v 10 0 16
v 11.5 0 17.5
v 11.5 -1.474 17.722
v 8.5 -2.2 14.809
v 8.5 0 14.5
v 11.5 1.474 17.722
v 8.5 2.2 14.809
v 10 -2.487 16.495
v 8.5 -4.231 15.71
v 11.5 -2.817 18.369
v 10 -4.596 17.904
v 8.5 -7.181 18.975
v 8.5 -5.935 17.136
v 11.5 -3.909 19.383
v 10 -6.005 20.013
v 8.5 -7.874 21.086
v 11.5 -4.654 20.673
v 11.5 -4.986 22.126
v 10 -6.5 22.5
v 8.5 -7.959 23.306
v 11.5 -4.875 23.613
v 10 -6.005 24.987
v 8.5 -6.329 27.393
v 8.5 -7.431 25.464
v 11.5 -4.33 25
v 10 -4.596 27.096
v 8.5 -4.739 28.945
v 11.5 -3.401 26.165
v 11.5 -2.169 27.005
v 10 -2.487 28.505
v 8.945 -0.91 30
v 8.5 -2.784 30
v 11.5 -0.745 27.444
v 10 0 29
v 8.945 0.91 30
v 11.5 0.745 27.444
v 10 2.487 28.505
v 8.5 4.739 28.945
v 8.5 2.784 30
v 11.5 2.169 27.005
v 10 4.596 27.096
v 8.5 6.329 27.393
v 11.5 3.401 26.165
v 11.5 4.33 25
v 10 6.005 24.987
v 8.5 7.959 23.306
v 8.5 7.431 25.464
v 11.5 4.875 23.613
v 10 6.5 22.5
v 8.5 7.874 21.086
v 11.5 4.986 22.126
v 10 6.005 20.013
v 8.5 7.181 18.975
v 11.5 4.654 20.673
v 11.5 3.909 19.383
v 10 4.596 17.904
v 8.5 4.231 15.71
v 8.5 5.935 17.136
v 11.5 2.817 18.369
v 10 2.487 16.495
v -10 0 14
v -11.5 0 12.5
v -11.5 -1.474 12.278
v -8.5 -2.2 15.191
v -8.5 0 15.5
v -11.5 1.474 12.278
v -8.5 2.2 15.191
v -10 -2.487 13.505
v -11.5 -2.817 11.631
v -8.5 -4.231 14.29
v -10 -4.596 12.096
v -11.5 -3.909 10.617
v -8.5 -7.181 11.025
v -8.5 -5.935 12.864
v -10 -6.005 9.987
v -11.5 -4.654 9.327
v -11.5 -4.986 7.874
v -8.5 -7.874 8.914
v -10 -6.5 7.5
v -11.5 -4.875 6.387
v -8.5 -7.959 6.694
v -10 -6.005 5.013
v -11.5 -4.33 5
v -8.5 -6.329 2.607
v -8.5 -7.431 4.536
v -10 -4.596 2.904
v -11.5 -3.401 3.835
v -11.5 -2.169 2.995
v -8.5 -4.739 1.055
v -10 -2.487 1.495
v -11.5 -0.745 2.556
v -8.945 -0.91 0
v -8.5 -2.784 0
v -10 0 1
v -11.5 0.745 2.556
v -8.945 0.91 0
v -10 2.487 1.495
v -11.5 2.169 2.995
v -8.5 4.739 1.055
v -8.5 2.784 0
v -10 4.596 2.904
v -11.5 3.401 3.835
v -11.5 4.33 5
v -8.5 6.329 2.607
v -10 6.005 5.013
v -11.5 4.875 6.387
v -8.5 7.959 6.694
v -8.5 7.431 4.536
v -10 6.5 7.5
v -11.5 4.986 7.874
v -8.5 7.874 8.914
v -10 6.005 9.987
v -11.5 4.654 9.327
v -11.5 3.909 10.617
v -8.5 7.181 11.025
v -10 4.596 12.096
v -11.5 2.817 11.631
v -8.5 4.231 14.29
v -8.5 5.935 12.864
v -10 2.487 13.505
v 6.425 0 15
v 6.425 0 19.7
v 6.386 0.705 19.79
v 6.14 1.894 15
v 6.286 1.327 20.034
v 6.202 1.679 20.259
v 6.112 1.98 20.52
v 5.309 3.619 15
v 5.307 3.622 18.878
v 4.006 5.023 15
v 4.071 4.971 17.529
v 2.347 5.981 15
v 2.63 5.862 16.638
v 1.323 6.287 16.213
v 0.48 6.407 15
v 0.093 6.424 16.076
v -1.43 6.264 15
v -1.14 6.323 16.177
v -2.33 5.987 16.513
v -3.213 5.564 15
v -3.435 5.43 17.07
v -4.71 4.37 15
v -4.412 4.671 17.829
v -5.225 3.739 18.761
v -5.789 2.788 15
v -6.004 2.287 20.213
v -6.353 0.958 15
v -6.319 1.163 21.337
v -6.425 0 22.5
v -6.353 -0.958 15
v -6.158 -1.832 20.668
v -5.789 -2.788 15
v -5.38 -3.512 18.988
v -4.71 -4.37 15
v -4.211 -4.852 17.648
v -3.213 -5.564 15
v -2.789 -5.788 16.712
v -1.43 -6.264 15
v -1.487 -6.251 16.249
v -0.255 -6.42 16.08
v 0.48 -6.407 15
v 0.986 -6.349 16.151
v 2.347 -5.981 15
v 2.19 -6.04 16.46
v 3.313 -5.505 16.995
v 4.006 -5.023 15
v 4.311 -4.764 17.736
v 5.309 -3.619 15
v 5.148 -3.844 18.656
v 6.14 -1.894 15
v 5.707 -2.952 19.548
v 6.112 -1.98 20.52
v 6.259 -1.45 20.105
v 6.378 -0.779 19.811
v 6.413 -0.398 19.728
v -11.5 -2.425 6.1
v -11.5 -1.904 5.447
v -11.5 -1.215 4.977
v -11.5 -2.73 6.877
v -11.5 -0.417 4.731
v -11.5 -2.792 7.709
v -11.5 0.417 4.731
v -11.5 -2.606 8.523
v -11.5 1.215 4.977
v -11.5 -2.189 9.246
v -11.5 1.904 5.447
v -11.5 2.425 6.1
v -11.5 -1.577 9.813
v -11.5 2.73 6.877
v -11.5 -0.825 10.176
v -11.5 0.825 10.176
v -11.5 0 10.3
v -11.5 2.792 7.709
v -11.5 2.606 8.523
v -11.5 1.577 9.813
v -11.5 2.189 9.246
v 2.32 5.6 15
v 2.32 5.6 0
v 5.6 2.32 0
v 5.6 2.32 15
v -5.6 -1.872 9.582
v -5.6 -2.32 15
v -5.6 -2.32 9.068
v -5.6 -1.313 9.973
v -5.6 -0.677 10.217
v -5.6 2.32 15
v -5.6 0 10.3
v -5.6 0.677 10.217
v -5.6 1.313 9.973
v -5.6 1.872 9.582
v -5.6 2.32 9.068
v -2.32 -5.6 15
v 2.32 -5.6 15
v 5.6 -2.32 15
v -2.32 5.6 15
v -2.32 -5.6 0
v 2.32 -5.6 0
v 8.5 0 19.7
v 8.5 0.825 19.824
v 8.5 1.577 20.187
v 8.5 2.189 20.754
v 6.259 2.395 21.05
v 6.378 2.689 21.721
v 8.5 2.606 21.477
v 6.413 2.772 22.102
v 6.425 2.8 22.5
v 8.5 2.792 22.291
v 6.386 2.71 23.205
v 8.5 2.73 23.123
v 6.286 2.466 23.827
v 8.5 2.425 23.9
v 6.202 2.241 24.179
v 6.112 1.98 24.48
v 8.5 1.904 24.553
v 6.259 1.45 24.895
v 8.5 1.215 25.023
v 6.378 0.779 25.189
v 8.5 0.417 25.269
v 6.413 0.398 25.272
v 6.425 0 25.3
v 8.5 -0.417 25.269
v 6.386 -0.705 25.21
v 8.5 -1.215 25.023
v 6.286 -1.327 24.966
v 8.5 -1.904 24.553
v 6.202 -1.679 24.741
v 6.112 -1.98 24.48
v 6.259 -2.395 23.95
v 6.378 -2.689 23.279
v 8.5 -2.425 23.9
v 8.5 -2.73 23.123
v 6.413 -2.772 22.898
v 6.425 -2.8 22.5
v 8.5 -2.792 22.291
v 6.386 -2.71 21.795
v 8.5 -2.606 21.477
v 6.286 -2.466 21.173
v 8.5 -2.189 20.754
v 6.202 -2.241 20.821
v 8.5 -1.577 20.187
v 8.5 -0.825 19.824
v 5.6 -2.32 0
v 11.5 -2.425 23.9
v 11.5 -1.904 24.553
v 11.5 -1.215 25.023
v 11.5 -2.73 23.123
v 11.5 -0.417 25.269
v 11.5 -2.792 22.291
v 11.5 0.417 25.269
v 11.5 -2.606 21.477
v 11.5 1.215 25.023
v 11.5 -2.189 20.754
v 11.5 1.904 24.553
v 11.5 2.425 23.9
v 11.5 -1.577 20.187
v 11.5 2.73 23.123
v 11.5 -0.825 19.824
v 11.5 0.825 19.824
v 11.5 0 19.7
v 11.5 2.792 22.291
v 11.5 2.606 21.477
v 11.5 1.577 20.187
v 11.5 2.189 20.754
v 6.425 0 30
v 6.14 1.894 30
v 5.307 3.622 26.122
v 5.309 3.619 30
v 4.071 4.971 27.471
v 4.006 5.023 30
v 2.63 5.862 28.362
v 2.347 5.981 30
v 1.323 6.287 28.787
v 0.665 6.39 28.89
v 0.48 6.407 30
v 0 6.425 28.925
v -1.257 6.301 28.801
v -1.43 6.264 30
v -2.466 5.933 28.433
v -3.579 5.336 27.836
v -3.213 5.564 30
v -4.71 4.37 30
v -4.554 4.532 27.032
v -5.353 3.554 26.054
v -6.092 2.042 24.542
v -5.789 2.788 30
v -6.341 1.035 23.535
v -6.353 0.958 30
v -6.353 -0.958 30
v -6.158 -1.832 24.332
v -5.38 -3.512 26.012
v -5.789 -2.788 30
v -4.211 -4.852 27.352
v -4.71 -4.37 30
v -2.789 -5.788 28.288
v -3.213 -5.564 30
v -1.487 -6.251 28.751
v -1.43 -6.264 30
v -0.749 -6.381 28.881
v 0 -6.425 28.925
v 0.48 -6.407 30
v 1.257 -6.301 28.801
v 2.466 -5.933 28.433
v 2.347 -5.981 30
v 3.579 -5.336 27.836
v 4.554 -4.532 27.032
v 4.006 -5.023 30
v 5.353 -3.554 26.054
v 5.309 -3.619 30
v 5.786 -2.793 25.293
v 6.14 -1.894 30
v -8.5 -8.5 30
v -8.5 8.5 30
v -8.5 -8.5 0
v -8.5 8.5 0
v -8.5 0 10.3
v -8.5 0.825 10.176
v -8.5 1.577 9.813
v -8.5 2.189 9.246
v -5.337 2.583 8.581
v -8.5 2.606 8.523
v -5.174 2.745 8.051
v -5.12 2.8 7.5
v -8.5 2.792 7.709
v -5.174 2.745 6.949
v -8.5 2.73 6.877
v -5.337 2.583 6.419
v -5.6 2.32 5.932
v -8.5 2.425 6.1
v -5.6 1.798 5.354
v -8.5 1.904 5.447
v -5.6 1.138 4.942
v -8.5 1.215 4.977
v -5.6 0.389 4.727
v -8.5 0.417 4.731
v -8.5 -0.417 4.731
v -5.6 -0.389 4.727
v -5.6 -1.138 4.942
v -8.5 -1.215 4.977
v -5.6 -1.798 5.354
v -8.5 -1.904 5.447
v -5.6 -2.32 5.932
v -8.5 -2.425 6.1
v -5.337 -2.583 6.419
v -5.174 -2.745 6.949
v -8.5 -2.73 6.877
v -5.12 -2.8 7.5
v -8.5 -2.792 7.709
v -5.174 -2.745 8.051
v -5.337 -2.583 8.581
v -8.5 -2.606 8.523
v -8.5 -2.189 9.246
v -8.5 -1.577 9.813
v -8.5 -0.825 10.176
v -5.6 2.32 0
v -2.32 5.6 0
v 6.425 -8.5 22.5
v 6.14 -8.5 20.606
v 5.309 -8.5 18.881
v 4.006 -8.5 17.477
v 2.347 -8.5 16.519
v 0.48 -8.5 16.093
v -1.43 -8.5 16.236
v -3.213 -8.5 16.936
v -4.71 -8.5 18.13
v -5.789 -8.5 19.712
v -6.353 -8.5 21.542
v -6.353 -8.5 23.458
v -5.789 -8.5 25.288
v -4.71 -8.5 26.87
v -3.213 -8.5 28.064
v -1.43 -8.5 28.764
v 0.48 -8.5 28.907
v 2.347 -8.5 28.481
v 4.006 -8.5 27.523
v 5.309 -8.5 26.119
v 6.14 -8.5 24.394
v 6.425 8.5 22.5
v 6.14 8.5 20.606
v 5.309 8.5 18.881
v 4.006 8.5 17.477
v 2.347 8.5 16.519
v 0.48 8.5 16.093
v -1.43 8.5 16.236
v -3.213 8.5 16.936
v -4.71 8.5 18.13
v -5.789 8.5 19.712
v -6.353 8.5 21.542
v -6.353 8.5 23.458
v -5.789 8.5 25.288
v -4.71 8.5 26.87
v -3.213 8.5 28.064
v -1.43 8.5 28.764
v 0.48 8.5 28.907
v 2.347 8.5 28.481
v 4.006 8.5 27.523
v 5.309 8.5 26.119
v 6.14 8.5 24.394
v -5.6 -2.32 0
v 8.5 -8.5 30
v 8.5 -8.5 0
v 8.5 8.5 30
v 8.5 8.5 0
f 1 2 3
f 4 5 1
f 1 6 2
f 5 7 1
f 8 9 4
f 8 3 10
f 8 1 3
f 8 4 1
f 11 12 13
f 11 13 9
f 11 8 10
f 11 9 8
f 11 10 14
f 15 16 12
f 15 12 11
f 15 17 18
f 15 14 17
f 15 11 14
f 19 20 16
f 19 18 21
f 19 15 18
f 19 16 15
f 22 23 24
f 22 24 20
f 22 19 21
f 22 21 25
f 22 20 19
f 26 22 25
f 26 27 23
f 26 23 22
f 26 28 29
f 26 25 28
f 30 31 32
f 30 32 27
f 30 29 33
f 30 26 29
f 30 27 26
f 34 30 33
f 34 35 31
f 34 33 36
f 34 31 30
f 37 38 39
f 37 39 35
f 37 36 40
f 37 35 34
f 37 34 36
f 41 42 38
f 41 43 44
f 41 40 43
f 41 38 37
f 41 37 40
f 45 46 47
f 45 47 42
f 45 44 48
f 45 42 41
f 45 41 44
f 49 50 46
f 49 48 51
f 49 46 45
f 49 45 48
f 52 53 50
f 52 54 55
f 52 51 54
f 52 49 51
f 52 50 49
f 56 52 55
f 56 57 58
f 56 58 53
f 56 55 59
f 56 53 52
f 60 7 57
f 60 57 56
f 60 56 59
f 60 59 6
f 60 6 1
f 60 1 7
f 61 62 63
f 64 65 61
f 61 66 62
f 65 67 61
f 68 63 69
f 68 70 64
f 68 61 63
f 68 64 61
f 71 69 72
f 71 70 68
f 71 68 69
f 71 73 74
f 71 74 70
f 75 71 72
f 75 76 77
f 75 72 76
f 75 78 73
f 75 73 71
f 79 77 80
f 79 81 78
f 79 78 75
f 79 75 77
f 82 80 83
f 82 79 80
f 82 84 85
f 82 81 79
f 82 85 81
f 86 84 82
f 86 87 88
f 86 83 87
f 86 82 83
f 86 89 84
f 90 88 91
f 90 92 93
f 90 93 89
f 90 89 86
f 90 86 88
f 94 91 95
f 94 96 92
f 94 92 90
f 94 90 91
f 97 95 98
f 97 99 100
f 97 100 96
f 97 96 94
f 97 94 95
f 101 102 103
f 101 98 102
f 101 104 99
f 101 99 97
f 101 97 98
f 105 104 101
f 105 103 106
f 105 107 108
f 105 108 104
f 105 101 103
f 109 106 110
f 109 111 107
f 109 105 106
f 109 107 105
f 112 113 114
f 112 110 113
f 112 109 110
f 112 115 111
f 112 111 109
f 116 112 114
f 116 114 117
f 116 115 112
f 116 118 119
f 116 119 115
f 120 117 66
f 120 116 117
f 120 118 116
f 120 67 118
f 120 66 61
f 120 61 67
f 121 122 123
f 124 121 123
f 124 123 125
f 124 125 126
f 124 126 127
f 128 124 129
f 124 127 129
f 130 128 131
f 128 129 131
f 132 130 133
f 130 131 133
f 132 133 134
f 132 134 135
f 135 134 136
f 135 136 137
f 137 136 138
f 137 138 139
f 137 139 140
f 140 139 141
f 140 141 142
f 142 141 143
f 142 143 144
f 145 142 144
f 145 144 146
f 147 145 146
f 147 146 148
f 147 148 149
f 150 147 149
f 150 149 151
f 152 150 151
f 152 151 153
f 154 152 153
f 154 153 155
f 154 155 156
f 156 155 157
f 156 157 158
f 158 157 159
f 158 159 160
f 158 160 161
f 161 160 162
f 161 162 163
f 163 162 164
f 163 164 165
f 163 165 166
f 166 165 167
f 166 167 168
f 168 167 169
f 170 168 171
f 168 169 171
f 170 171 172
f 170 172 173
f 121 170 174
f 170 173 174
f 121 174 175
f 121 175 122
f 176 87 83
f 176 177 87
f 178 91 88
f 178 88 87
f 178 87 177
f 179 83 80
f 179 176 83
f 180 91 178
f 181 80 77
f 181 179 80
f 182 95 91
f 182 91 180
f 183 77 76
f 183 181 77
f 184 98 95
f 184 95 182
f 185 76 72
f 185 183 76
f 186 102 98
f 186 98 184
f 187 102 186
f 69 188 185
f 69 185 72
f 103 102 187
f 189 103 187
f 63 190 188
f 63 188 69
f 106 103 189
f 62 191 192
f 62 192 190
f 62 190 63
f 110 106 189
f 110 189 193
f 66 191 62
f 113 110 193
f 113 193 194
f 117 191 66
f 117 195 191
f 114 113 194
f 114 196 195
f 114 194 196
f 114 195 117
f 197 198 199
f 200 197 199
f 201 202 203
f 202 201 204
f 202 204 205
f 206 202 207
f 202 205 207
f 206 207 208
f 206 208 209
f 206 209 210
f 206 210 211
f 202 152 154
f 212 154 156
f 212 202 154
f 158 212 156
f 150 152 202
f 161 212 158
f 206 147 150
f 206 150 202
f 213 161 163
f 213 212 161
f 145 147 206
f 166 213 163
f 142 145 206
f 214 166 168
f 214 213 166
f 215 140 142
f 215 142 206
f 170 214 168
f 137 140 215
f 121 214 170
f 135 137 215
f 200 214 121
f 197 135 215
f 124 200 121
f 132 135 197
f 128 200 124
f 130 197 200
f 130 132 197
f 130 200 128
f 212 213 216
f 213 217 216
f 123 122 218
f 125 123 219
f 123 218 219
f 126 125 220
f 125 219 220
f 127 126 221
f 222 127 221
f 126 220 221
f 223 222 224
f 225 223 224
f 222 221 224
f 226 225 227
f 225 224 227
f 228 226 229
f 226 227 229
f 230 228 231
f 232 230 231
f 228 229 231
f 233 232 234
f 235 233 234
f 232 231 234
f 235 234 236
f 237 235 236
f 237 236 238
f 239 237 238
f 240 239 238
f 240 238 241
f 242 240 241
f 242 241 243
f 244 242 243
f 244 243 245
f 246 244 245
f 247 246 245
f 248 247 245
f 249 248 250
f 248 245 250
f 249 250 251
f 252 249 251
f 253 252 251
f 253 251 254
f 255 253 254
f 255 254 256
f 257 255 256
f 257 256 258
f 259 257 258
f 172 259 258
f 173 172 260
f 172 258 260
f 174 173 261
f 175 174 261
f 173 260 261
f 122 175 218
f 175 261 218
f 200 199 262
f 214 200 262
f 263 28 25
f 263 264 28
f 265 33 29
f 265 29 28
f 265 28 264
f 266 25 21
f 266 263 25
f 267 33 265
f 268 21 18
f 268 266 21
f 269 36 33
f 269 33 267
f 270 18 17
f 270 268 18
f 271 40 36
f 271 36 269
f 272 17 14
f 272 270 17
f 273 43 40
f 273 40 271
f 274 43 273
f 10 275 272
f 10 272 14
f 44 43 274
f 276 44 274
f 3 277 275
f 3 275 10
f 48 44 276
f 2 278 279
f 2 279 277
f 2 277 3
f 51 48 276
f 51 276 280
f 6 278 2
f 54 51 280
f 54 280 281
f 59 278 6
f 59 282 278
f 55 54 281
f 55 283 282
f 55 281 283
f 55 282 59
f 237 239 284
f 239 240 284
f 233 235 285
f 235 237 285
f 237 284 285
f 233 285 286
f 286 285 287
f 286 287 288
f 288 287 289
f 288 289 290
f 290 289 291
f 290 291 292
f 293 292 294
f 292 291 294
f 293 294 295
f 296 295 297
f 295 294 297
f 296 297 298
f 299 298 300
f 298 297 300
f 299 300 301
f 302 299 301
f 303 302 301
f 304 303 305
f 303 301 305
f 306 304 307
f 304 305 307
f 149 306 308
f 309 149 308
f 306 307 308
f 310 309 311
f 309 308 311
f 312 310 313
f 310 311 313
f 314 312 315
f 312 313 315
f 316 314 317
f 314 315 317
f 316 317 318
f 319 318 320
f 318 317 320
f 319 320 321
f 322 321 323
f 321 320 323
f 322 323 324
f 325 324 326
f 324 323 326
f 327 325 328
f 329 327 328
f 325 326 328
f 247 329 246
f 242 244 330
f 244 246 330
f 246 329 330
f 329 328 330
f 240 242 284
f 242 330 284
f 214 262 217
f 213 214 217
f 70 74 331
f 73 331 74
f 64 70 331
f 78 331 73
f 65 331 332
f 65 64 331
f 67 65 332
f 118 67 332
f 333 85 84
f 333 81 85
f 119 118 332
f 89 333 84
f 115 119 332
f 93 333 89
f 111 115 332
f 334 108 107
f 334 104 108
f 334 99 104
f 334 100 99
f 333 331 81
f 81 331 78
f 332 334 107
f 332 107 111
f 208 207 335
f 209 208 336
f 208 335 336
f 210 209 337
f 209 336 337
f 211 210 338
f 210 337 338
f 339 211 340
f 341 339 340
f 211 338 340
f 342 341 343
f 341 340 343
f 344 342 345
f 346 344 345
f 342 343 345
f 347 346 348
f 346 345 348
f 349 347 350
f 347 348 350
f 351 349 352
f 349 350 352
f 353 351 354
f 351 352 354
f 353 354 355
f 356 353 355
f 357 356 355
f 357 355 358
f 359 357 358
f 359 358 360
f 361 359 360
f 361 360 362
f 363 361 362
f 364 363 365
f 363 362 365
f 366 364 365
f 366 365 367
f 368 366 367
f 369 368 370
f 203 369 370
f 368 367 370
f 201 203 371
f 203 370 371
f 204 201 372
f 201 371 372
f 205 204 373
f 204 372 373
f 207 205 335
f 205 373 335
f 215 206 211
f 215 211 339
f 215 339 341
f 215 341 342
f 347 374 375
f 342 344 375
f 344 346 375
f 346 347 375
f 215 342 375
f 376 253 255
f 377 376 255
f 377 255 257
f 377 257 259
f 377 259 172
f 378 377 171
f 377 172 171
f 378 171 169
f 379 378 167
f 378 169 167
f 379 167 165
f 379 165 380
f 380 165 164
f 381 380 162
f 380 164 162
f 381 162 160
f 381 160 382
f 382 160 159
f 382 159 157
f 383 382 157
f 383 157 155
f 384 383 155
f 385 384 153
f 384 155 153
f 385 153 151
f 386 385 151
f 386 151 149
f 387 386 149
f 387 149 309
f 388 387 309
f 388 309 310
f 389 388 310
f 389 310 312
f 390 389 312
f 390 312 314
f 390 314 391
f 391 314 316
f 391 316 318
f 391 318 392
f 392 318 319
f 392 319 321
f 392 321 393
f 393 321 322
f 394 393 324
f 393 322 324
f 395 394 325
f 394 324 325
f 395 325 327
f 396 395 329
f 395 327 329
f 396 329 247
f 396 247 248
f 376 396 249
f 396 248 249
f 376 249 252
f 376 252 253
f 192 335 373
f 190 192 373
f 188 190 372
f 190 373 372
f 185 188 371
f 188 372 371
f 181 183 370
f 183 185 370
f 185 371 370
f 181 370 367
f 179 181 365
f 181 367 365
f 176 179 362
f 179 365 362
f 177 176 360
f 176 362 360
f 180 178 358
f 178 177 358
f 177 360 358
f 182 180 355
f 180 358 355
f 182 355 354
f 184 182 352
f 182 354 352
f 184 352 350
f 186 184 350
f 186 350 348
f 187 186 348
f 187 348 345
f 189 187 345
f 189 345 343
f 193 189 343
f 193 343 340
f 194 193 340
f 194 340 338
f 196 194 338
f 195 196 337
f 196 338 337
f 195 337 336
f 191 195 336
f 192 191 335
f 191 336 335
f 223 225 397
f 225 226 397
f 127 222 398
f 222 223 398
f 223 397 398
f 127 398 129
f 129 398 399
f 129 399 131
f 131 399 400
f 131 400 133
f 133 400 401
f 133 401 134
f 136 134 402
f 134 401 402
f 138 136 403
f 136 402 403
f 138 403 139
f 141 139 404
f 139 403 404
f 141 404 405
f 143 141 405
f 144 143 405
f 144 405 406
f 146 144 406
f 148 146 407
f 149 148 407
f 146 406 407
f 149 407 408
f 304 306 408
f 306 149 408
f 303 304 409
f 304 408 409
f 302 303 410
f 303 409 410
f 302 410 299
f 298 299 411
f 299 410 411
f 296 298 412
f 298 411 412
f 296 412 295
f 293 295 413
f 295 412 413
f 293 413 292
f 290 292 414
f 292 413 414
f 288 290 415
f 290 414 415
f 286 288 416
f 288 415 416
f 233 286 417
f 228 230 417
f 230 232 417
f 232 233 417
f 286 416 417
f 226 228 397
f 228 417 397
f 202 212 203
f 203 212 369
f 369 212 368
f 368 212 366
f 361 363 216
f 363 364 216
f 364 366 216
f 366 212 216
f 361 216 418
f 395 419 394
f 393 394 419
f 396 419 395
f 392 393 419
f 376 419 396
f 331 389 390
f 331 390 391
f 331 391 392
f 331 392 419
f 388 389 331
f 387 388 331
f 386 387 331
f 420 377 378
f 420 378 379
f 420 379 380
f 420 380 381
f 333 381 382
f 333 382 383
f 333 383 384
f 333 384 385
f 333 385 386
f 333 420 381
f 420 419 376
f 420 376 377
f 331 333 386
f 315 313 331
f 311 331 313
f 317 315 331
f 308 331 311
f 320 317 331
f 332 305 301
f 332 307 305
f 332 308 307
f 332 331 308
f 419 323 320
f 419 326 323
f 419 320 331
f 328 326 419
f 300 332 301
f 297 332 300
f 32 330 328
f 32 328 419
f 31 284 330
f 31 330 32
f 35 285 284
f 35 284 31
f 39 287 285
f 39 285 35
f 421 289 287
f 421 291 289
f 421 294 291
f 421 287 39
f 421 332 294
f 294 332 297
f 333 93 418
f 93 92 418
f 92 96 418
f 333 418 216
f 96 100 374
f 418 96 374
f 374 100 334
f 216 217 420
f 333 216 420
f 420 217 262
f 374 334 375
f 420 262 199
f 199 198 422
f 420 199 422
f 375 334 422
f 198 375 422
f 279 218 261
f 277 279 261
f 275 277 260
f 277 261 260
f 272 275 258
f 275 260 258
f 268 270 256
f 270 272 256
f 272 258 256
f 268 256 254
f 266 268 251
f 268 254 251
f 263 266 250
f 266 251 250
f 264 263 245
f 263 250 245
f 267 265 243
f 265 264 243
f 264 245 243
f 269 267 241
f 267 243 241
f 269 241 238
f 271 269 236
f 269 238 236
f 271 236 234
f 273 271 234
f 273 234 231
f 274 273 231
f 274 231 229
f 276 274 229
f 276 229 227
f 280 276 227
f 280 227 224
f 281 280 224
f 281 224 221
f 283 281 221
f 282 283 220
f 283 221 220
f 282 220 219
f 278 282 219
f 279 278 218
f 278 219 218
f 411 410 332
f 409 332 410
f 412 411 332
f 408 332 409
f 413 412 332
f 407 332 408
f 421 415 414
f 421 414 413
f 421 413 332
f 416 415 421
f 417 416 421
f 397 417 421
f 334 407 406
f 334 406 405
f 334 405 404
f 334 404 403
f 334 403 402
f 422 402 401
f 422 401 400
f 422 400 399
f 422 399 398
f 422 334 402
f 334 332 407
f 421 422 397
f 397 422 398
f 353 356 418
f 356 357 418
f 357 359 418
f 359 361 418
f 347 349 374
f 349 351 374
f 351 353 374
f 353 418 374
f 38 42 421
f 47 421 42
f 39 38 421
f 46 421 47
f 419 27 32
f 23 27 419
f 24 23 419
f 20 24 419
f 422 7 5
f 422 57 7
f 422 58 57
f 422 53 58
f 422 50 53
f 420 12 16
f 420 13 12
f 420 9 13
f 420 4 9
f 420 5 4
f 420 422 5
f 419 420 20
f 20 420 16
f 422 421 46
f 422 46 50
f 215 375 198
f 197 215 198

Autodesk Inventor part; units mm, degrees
ref_plane "YZ Plane" through (0, 0, 0) normal (1, 0, 0) x (0, 1, 0)
ref_plane "XZ Plane" through (0, 0, 0) normal (0, 1, 0) x (-1, 0, 0)
ref_plane "XY Plane" through (0, 0, 0) normal (0, 0, 1) x (1, 0, 0)
sketch "Sketch1" plane through (0, 0, 0) normal (0, 0, 1) x (1, 0, 0)
  line L0 (-8.5, 8.5) -> (8.5, 8.5)
  line L1 (8.5, 8.5) -> (8.5, -8.5)
  line L2 (8.5, -8.5) -> (-8.5, -8.5)
  line L3 (-8.5, -8.5) -> (-8.5, 8.5)
  line L4 (-8.5, 8.5) -> (8.5, -8.5) construction
  line L5 (8.5, 8.5) -> (-8.5, -8.5) construction
  line L6 (5.5, -2.2782) -> (2.2782, -5.5)
  line L7 (2.2782, -5.5) -> (-2.2782, -5.5)
  line L8 (-2.2782, -5.5) -> (-5.5, -2.2782)
  line L9 (-5.5, -2.2782) -> (-5.5, 2.2782)
  line L10 (-5.5, 2.2782) -> (-2.2782, 5.5)
  line L11 (-2.2782, 5.5) -> (2.2782, 5.5)
  line L12 (2.2782, 5.5) -> (5.5, 2.2782)
  line L13 (5.5, 2.2782) -> (5.5, -2.2782)
  line L14 (5.6, -2.3196) -> (2.3196, -5.6)
  line L15 (2.3196, -5.6) -> (-2.3196, -5.6)
  line L16 (-2.3196, -5.6) -> (-5.6, -2.3196)
  line L17 (-5.6, -2.3196) -> (-5.6, 2.3196)
  line L18 (-5.6, 2.3196) -> (-2.3196, 5.6)
  line L19 (-2.3196, 5.6) -> (2.3196, 5.6)
  line L20 (2.3196, 5.6) -> (5.6, 2.3196)
  line L21 (5.6, 2.3196) -> (5.6, -2.3196)
  point P0 (0, 0)
  dimension "d2" = 17
  dimension "d3" = 17
  dimension "d28" = 11
  dimension "d29" = 0.1
extrude "Extrusion1" add sketch "Sketch1" along normal blind 30 contours L0 L1 L2 L3 | L6 L7 L8 L9 L10 L11 L12 L13 | L14 L15 L16 L17 L18 L19 L20 L21
extrude "Extrusion2" cut sketch "Sketch1" along normal blind 15 contours L6 L7 L8 L9 L10 L11 L12 L13 | L14 L15 L16 L17 L18 L19 L20 L21
sketch "Sketch2" plane through (0, 0, 30) normal (0, 0, 1) x (1, 0, 0)
  circle A0 centre (0, 0) radius 6.425
  dimension "d8" = 12.85
extrude "Extrusion3" cut sketch "Sketch2" against normal blind 15
sketch "Sketch3" plane through (-8.5, 8.5, 0) normal (0, 1, 0) x (1, 0, 0)
  line L0 (17, 0) -> (0, 0) projected
  line L1 (0, 0) -> (0, -30) projected
  line L2 (17, -30) -> (0, -30) projected
  line L3 (17, 0) -> (17, -30) projected
  line L4 (0, 0) -> (0, -30) construction
  line L5 (0, -30) -> (17, -15)
  line L6 (17, 0) -> (17, -30) construction
  circle A0 centre (8.5, -22.5) radius 6.425
  line L7 (17, -30) -> (0, -15)
  line L8 (0, 0) -> (0, -30) construction
  point P0 (8.5, 0)
  dimension "d11" = 12.85
extrude "Extrusion4" cut sketch "Sketch3" against normal through all contours A0 L7 L5 | L5 L7 A0 | L7 L5 A0 | A0 L5 L7
sketch "Sketch4" plane through (8.5, -8.5, 0) normal (1, 0, 0) x (0, 0, -1)
  line L0 (0, 17) -> (-30, 17) construction
  line L1 (-15, 17) -> (-15, 0) construction
  line L2 (0, 0) -> (-30, 0) construction
  line L3 (-30, 17) -> (-30, 0) construction
  line L4 (-30, 17) -> (-15, 0) construction
  line L5 (-15, 17) -> (-30, 0) construction
  circle A0 centre (-22.5, 8.5) radius 2.8
  circle A1 centre (-22.5, 8.5) radius 5
  point P0 (0, 8.5)
  dimension "d14" = 5.6
  dimension "d15" = 10
ref_plane "Work Plane1" through (-8.5, 0, 0) normal (0, -1, 0) x (1, 0, 0)
sketch "Sketch5" plane through (-8.5, 0, 0) normal (0, -1, 0) x (1, 0, 0)
  line L0 (17, 0) -> (17, 30) construction
  line L1 (0, 0) -> (0, 30) construction
  line L2 (17, 0) -> (0, 0) construction
  line L3 (17, 30) -> (0, 30) construction
  point P0 (8.5, 0)
  point P1 (17, 22.5)
  point P2 (0, 7.5)
  dimension "d23" = 7.5
  dimension "d24" = 7.5
extrude "Extrusion5" add sketch "Sketch4" along normal blind 3
extrude "Extrusion6" cut sketch "Sketch4" against normal blind 5 contours A0
pattern_sketch "Sketch Driven Pattern1" of "Extrusion6", "Extrusion5" from (8.5, 0, 22.5) facing (1, 0, 0) copies at (-8.5, 0, 7.5) facing (-1, 0, 0)
chamfer "Chamfer2" distance 3 angle 45 2 edges at (8.5, 0, 27.5) (-8.5, 0, 2.5)
equation "\"d2\" = d3"
equation "\"d23\" = d24"
properties part number "waxing_station"
